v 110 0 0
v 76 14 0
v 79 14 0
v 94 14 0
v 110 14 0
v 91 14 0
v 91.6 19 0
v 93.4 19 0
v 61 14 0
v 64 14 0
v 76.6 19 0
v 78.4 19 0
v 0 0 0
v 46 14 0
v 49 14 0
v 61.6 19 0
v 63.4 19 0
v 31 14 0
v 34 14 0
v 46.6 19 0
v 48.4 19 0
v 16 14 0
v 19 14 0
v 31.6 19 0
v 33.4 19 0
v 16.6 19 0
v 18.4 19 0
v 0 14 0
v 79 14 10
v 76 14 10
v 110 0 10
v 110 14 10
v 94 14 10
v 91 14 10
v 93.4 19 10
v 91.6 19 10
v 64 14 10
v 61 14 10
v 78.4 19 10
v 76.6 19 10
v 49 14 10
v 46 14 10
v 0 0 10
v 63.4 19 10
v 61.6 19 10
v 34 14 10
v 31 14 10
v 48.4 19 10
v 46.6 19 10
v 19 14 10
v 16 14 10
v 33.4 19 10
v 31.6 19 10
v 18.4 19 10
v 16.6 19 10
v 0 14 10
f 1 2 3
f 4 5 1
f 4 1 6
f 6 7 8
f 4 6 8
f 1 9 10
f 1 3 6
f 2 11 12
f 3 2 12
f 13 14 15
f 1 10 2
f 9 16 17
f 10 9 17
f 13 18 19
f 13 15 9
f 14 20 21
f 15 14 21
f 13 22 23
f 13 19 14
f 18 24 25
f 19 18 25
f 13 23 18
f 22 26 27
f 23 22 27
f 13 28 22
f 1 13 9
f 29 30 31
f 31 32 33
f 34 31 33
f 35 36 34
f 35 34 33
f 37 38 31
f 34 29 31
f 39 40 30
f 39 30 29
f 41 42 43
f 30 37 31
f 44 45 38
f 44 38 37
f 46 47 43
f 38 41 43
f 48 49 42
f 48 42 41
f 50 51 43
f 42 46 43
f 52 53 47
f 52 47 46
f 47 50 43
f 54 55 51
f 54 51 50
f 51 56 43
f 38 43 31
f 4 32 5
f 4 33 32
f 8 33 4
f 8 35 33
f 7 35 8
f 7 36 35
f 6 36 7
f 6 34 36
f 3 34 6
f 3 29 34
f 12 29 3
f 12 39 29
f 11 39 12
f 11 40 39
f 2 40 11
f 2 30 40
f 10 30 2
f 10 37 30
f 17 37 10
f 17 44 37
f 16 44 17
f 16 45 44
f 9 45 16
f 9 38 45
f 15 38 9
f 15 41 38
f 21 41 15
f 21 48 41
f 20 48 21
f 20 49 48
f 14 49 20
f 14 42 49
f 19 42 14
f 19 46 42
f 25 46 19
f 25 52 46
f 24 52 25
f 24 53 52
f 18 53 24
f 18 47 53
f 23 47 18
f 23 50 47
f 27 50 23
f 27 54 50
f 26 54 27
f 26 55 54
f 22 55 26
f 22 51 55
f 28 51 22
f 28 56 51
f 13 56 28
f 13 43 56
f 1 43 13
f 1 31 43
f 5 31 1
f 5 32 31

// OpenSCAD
$fn = 32;

// ----------------------------------------------------------------------
// Gear rack: 6 teeth on a 110 mm bar, pitch 15 mm
// ----------------------------------------------------------------------

// --- parameters (mm) ---
profile_height = 10;      // extrusion height
profile_points = 28;      // points of the closed outline

profile = [[0, 0], [110, 0], [110, 14], [94, 14], [93.4, 19], [91.6, 19], [91, 14], [79, 14], [78.4, 19], [76.6, 19], [76, 14], [64, 14], [63.4, 19], [61.6, 19], [61, 14], [49, 14], [48.4, 19], [46.6, 19], [46, 14], [34, 14], [33.4, 19], [31.6, 19], [31, 14], [19, 14], [18.4, 19], [16.6, 19], [16, 14], [0, 14]];  // single closed polygon, 28 points, counter clockwise

// --- the one profile operation ---
linear_extrude(height = profile_height) polygon(points = profile);
